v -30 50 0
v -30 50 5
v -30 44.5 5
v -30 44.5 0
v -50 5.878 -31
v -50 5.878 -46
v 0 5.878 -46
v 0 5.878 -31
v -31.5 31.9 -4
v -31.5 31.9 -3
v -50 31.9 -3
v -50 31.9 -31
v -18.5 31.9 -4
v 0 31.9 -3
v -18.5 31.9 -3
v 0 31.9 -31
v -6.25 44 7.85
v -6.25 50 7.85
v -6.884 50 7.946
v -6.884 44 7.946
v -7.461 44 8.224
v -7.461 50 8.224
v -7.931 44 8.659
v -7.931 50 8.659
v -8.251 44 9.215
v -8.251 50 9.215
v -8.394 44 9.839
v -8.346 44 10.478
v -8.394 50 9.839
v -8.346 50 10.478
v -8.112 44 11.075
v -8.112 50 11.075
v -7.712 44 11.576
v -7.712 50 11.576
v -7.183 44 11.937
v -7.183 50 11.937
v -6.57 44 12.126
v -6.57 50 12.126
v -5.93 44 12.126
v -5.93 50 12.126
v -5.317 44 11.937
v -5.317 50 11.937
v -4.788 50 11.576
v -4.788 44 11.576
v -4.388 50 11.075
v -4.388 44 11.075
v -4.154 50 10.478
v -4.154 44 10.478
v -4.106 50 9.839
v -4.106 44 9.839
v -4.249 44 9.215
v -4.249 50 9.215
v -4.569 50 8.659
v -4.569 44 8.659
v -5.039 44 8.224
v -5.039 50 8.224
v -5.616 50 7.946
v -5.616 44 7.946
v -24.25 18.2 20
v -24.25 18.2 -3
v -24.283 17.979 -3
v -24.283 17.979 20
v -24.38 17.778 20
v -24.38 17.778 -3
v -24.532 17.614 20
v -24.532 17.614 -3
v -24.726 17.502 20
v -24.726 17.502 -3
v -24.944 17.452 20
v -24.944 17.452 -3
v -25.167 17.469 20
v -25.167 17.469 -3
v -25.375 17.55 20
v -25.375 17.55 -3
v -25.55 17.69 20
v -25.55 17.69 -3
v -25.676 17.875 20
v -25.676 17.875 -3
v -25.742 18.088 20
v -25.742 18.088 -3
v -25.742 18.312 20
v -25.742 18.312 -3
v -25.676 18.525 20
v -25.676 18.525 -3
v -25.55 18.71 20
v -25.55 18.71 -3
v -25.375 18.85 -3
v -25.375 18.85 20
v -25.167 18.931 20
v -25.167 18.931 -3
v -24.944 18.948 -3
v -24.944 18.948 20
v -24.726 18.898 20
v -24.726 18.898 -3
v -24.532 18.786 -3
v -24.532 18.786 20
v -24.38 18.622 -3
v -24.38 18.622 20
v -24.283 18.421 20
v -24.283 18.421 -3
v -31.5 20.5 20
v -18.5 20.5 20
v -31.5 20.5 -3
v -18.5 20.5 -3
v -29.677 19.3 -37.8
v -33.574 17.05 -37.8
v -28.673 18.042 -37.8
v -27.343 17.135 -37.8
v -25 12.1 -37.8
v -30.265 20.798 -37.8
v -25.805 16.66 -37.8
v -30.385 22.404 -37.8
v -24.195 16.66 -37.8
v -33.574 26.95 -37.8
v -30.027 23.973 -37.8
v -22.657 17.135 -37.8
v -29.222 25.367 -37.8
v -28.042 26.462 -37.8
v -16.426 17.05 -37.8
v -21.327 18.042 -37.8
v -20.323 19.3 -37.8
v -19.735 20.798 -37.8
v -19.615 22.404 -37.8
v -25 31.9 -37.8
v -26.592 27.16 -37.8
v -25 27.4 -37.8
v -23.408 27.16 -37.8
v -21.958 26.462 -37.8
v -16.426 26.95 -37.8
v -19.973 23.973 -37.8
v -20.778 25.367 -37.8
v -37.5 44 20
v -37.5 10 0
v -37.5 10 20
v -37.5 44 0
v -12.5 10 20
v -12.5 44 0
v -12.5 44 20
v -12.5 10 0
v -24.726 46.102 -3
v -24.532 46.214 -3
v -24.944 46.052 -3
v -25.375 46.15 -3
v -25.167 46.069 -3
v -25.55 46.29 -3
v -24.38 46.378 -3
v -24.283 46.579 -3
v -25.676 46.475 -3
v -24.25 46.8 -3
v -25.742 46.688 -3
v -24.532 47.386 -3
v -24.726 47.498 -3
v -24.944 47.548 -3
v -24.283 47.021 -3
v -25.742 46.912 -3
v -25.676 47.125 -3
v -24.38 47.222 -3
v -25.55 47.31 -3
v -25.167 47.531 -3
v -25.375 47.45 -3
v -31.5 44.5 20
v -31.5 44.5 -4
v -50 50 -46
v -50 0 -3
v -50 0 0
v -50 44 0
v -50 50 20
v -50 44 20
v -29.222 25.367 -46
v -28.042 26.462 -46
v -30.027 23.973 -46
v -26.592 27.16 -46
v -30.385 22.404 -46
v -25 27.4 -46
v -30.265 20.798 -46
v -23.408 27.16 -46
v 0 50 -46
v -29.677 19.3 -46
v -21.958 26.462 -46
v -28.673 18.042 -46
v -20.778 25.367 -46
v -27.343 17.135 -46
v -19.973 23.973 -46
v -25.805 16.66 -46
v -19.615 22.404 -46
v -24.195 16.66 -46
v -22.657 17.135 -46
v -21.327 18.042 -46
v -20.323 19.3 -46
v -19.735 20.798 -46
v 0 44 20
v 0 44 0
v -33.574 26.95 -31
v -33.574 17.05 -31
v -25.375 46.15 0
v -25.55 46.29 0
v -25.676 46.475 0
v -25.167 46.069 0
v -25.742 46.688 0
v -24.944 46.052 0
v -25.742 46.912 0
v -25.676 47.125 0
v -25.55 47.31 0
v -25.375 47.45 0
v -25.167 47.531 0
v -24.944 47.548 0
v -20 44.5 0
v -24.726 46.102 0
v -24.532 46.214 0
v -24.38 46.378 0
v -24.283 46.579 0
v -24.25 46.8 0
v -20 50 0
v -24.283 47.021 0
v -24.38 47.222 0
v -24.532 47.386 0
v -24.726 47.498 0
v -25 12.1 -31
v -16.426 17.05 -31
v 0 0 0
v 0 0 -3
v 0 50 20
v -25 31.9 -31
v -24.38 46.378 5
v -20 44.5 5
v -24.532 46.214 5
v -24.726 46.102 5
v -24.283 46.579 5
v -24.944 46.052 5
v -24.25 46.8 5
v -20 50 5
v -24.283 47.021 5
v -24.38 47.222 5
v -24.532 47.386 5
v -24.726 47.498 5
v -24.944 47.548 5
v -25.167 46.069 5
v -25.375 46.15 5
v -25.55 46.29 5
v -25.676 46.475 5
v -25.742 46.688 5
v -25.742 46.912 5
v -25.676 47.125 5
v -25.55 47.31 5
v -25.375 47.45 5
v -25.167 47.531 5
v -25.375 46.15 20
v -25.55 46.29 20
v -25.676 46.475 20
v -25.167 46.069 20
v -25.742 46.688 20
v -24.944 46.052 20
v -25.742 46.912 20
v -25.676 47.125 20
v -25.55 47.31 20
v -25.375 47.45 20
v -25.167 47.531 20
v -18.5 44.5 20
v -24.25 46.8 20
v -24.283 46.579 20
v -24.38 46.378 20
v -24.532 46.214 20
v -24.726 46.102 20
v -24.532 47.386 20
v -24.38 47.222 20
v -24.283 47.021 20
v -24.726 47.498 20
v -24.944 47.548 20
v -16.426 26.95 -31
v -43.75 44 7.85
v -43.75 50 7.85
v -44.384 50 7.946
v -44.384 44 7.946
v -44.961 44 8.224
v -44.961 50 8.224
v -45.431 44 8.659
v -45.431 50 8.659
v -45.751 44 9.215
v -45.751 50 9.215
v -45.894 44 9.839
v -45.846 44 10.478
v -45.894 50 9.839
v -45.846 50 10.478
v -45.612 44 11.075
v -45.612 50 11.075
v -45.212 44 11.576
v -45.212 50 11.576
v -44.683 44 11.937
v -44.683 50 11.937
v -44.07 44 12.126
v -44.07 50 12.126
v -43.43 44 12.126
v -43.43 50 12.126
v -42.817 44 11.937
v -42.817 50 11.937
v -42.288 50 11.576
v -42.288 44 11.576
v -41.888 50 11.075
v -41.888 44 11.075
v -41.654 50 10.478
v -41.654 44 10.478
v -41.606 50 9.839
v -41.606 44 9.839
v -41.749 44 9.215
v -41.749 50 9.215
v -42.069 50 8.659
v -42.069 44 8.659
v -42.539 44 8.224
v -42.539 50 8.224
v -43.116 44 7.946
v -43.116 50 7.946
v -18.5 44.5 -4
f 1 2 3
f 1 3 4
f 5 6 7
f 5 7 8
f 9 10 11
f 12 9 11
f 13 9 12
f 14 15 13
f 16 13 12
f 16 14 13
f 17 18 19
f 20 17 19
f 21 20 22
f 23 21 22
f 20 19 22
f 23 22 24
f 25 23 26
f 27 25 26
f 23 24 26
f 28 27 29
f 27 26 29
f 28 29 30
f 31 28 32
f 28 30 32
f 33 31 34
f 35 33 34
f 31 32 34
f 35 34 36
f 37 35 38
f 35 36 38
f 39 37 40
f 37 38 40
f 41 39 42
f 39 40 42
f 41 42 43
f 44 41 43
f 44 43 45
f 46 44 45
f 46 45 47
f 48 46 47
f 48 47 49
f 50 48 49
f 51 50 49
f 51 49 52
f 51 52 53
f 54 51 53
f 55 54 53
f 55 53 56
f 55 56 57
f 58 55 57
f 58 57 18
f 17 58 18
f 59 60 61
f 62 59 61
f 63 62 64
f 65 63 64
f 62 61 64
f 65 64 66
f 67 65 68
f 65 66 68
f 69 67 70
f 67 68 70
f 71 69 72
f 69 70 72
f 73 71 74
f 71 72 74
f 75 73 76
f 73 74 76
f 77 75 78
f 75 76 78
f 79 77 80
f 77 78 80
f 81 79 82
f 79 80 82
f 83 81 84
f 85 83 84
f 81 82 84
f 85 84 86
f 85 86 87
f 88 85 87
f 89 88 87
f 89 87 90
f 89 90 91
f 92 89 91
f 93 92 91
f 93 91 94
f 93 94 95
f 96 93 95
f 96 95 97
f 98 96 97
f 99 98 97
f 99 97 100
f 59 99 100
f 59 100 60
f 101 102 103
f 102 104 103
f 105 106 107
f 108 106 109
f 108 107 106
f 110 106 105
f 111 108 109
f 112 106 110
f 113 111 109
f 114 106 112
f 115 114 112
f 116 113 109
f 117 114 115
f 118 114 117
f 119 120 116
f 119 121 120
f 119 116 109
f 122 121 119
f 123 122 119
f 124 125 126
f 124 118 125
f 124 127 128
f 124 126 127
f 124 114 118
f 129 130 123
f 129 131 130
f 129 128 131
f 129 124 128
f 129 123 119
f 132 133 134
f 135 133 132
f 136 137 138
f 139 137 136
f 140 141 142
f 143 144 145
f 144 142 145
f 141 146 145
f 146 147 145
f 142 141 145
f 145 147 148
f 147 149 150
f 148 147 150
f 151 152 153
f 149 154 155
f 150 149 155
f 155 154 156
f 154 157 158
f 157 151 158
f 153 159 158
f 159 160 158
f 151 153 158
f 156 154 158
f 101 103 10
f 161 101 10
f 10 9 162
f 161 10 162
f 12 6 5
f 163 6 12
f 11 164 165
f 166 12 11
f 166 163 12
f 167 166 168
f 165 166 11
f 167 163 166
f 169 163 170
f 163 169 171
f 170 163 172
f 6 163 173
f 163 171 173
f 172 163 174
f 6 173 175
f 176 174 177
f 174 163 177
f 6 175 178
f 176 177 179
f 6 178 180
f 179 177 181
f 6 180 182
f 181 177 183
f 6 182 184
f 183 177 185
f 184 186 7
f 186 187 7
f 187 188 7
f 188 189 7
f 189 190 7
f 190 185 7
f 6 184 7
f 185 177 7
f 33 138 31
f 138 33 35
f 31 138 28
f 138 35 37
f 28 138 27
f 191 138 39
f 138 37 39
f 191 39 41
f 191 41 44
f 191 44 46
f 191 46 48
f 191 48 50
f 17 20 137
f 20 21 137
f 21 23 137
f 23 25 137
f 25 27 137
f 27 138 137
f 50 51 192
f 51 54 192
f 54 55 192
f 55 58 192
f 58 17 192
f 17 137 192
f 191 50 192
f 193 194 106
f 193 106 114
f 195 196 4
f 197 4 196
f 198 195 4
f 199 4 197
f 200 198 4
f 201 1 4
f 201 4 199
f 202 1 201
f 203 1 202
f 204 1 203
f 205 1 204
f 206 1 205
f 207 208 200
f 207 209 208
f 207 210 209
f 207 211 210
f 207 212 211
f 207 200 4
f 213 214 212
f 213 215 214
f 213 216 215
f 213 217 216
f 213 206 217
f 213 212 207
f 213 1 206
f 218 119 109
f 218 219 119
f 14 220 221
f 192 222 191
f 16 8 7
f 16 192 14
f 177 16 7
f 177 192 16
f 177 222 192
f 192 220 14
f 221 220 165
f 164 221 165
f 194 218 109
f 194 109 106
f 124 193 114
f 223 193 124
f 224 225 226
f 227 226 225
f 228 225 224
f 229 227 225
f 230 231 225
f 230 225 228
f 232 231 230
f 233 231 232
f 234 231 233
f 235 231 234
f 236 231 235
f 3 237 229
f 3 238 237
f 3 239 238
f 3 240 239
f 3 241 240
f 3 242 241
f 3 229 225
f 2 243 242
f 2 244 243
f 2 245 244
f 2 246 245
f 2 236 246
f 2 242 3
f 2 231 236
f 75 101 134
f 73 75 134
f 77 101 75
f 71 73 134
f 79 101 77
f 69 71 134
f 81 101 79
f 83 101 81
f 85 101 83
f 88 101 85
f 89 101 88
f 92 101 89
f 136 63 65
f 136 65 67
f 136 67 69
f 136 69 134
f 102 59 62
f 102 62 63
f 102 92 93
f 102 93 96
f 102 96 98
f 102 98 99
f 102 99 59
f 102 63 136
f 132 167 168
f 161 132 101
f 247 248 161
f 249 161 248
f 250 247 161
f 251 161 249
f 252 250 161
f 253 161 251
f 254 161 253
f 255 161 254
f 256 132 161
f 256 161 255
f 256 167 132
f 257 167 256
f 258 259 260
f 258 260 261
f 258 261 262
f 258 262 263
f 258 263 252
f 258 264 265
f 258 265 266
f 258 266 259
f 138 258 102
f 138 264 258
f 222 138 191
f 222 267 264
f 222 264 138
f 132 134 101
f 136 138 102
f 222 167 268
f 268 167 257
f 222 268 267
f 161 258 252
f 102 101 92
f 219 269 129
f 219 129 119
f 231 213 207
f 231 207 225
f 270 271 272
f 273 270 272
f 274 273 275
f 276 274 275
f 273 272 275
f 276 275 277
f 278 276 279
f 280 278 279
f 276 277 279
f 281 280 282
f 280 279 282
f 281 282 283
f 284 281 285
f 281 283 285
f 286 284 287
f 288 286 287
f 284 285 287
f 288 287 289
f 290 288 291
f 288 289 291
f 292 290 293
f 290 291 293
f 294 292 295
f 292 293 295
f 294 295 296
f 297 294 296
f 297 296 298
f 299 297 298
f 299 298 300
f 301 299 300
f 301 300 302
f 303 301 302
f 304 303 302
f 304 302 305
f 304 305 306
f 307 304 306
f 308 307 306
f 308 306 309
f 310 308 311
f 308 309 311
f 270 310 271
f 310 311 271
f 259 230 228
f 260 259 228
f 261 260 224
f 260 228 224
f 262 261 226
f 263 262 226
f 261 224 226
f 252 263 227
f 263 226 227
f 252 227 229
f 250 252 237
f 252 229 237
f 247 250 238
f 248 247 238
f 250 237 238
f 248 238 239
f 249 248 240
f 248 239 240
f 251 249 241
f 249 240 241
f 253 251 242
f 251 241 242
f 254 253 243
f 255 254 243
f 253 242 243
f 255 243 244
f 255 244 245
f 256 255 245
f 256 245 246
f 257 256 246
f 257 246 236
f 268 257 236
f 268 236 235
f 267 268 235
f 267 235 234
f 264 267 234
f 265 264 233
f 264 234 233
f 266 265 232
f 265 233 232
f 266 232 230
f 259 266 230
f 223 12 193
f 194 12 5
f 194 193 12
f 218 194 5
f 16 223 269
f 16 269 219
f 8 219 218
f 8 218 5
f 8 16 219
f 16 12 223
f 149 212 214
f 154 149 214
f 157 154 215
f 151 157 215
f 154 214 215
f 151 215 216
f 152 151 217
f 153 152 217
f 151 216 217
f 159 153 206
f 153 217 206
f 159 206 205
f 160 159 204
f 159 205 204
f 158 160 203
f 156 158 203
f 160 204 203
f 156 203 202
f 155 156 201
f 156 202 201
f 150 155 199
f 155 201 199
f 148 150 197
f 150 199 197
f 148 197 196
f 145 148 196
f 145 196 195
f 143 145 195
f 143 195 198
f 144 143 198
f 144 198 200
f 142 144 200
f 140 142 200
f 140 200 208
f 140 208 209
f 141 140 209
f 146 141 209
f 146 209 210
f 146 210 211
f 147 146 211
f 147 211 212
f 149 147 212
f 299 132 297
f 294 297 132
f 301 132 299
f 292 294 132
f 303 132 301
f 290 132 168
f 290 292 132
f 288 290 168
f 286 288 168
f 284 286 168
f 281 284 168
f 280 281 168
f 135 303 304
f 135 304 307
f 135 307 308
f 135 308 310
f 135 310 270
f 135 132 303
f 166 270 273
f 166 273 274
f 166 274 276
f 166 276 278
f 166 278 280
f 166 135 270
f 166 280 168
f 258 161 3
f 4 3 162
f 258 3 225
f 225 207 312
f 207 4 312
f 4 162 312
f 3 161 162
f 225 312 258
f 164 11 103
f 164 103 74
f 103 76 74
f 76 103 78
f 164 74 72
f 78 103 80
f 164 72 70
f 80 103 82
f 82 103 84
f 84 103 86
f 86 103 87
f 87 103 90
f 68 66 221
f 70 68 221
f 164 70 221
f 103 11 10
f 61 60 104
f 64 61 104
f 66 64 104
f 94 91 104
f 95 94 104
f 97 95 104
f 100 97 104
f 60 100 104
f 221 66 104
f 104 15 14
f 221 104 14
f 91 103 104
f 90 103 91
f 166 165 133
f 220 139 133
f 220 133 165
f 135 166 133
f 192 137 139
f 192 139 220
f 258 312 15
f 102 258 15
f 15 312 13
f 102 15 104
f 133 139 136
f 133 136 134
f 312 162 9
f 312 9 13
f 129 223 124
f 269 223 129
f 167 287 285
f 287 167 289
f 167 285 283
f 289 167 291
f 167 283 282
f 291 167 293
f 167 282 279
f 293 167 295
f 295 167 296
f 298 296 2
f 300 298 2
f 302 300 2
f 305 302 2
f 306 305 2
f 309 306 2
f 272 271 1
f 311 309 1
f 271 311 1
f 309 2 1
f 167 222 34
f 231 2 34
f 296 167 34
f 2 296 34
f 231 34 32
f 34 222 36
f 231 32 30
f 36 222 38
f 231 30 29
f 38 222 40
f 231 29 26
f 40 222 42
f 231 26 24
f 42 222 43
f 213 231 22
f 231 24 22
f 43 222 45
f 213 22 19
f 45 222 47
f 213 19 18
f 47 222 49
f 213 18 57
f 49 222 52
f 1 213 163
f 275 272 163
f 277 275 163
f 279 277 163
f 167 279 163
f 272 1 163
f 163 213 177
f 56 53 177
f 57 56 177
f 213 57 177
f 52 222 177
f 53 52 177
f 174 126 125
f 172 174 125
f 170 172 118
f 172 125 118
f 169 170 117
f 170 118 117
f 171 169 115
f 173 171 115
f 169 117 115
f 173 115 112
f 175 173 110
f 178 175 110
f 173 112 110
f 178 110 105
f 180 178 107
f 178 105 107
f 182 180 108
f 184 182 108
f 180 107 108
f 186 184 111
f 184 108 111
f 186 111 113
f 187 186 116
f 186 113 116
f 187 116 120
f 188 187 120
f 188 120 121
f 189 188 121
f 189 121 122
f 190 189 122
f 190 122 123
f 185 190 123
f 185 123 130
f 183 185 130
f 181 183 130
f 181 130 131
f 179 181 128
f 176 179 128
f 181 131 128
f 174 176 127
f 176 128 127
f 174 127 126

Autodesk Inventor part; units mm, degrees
ref_plane "YZ Plane" through (0, 0, 0) normal (1, 0, 0) x (0, 1, 0)
ref_plane "XZ Plane" through (0, 0, 0) normal (0, 1, 0) x (-1, 0, 0)
ref_plane "XY Plane" through (0, 0, 0) normal (0, 0, 1) x (1, 0, 0)
sketch "Sketch1" plane through (0, 0, 0) normal (0, 0, 1) x (1, 0, 0)
  point P0 (0, 0)
sketch "Sketch2" plane through (0, 0, 0) normal (0, 0, 1) x (1, 0, 0)
  line L0 (0, 0) -> (-50, 0)
  line L1 (0, 0) -> (-50, 0)
  line L2 (0, 0) -> (-50, 0)
  line L3 (-50, 0) -> (-50, 50)
  line L4 (-50, 50) -> (0, 50)
  line L5 (0, 50) -> (0, 0)
  line L6 (-31.5, 44) -> (-18.5, 44)
  line L7 (-18.5, 44) -> (-18.5, 21)
  line L8 (-18.5, 21) -> (-31.5, 21)
  line L9 (-31.5, 21) -> (-31.5, 44)
  circle A0 centre (-25, 46.8) radius 0.75
  circle A1 centre (-25, 18.2) radius 0.75
  line L10 (-37.5, 50) -> (-12.5, 50)
  line L11 (-12.5, 50) -> (-12.5, 10)
  line L12 (-12.5, 10) -> (-37.5, 10)
  line L13 (-37.5, 10) -> (-37.5, 50)
  line L14 (-37.5, 44) -> (-50, 44)
  line L15 (-12.5, 44) -> (0, 44)
  dimension "d4" = 50
  dimension "d5" = 50
  dimension "d6" = 13
  dimension "d7" = 23
  dimension "d8" = 18.5
  dimension "d9" = 6
  dimension "d10" = 1.5
  dimension "d11" = 6.5
  dimension "d12" = 2.8
  dimension "d13" = 1.5
  dimension "d14" = 6.5
  dimension "d15" = 2.8
  dimension "d16" = 25
  dimension "d17" = 40
  dimension "d18" = 12.5
extrude "Extrusion1" add sketch "Sketch2" along normal blind 20 contours L11 L12 L13 L4
extrude "Extrusion2" add sketch "Sketch2" along normal blind 3 contours L6 L7 L8 L9
extrude "Extrusion3" add sketch "Sketch2" against normal blind 3 contours L0 L3 L14 L13 L12 L11 L15 L5 | L15 L11 L4 L5 | L3 L4 L13 L14
extrude "Extrusion4" add sketch "Sketch2" against normal blind 3 contours L11 L12 L13 L4
extrude "Extrusion5" add sketch "Sketch2" against normal blind 3 contours L6 L7 L8 L9
sketch "Sketch3" plane through (-18.5, 21, 20) normal (-1, 0, 0) x (0, 0, 1)
  point P0 (-20, -21)
sketch "Sketch4" plane through (0, 0, -3) normal (0, 0, -1) x (-1, 0, 0)
  line L0 (12.5, 50) -> (37.5, 50) projected
  line L1 (37.5, 50) -> (37.5, 10) projected
  line L2 (12.5, 50) -> (37.5, 50)
  line L3 (37.5, 50) -> (37.5, 35.8782)
  line L4 (37.5, 35.8782) -> (12.5, 35.8782)
  line L5 (12.5, 35.8782) -> (12.5, 50)
  point P0 (0, 0)
extrude "Extrusion6" add sketch "Sketch4" along normal blind 40
sketch "Sketch5" plane through (-37.5, 35.8782, -3) normal (0, -1, 0) x (1, 0, 0)
  line L0 (0, -40) -> (25, -40) projected
  line L1 (25, -40) -> (0, -40)
  line L2 (0, -40) -> (0, -28)
  line L3 (0, -28) -> (25, -28)
  line L4 (25, -28) -> (25, -40)
  point P0 (37.5, 3)
  dimension "d31" = 25
  dimension "d32" = 12
extrude "Extrusion7" add sketch "Sketch5" along normal blind 30
sketch "Sketch6" plane through (0, 0, -43) normal (0, 0, -1) x (-1, 0, 0)
  circle A0 centre (25, 22) radius 5.4
  line L0 (37.5, 50) -> (12.5, 50) projected
  line L1 (37.5, 50) -> (37.5, 5.8782) projected
  point P0 (0, 0)
  dimension "d35" = 10.8
  dimension "d36" = 28
  dimension "d37" = 12.5
hole "Hole1" at (-25, 22, -43) direction (0, 0, 1) diameter 10.8 depth 12
sketch "Sketch7" plane through (-37.5, 50, 20) normal (0, 1, 0) x (1, 0, 0)
  line L0 (0, 20) -> (25, 20) projected
  line L1 (7.5, 20) -> (17.5, 20)
  line L2 (17.5, 20) -> (17.5, 15)
  line L3 (17.5, 15) -> (7.5, 15)
  line L4 (7.5, 15) -> (7.5, 20)
  line L5 (0, 20) -> (0, 0) projected
  point P0 (37.5, 20)
  dimension "d47" = 10
  dimension "d48" = 5
  dimension "d49" = 7.5
extrude "Extrusion8" cut sketch "Sketch7" against normal blind 10
extrude "Extrusion9" cut sketch "Sketch2" against normal blind 2 contours L6 L7 L8 L9
extrude "Extrusion10" cut sketch "Sketch2" along normal blind 3 contours L6 L7 L8 L9
extrude "Extrusion11" add sketch "Sketch2" against normal blind 3 contours L6 L7 L8 L9
extrude "Extrusion12" cut sketch "Sketch2" against normal blind 4 contours L6 L7 L8 L9
thicken "Thicken1" operation add thickness 12.5 both sides no extend neighbours yes toward (1, 0, 0) faces at (-12.5, 45.2927, -25.6667)
thicken "Thicken2" operation add thickness 12.5 both sides no extend neighbours yes toward (-1, 0, 0) faces at (-37.5, 45.2927, -25.6667)
thicken "Thicken3" operation add thickness 0.5 both sides no extend neighbours yes toward (0, -1, 0) faces at (-27.1667, 21, 12.3333)
thicken "Thicken4" operation add thickness 0.5 both sides no extend neighbours yes toward (0, 1, 0) faces at (-26.6667, 44, 15)
sketch "Sketch8" plane through (0, 5.8782, -31) normal (0, 0, 1) x (1, 0, 0)
  point P0 (0, -5.8782)
sketch "Sketch9" plane through (0, 5.8782, -31) normal (0, 0, 1) x (1, 0, 0)
  circle A0 centre (-25, 16.1218) radius 5.4 projected
  circle A1 centre (-25, 16.1218) radius 9.9
  line L0 (-25, 6.2218) -> (-33.5737, 11.1718)
  line L1 (-33.5737, 11.1718) -> (-33.5737, 21.0718)
  line L2 (-33.5737, 21.0718) -> (-25, 26.0218)
  line L3 (-25, 26.0218) -> (-16.4263, 21.0718)
  line L4 (-16.4263, 21.0718) -> (-16.4263, 11.1718)
  line L5 (-16.4263, 11.1718) -> (-25, 6.2218)
  point P0 (0, -5.8782)
  dimension "d68" = 19.8
extrude "Extrusion13" cut sketch "Sketch9" against normal blind 6.8 contours A0 | L4 L5 L0 L1 L2 L3
thicken "Thicken5" operation add thickness 3.978 both sides no extend neighbours yes toward (0, -1, 0) faces at (-22.8333, 35.8782, -22)
thicken "Thicken6" operation add thickness 3 both sides no extend neighbours yes toward (0, 0, -1) faces at (-25, 42.4667, -43)
extrude "Extrusion14" add sketch "Sketch2" along normal up to surface (20 mm away) contours L15 L11 L4 L5 | L3 L4 L13 L14
sketch "Sketch10" plane through (-50, 44, 20) normal (0, -1, 0) x (1, 0, 0)
  point P0 (50, -20)
sketch "Sketch11" plane through (-50, 44, 20) normal (0, -1, 0) x (1, 0, 0)
  line L0 (12.5, -20) -> (0, 0)
  line L1 (12.5, 0) -> (12.5, -20) projected
  line L2 (12.5, 0) -> (0, -20)
  point P0 (50, -20)
  point P1 (6.25, -10)
hole "Hole2" at (-43.75, 44, 10) direction (0, 1, 0) diameter 4.3 end through all
sketch "Sketch12" plane through (-12.5, 44, 20) normal (0, -1, 0) x (1, 0, 0)
  line L0 (0, -20) -> (0, 0) projected
  line L1 (12.5, -20) -> (0, 0)
  line L2 (12.5, 0) -> (0, -20)
  point P0 (6.25, -10)
hole "Hole3" at (-6.25, 44, 10) direction (0, 1, 0) diameter 4.3 end through all
sketch "Sketch13" plane through (-50, 50, 20) normal (0, 1, 0) x (1, 0, 0)
  circle A0 centre (6.25, 10) radius 2.15 projected
  circle A1 centre (6.25, 10) radius 2.15
  circle A2 centre (43.75, 10) radius 2.15 projected
  circle A3 centre (43.75, 10) radius 2.15
  line L0 (-0.0918, 20) -> (50, 20)
  line L1 (50, 20) -> (50, 0)
  line L2 (50, 0) -> (-0.0918, 0)
  line L3 (-0.0918, 0) -> (-0.0918, 20)
properties part number "servo_holder"
